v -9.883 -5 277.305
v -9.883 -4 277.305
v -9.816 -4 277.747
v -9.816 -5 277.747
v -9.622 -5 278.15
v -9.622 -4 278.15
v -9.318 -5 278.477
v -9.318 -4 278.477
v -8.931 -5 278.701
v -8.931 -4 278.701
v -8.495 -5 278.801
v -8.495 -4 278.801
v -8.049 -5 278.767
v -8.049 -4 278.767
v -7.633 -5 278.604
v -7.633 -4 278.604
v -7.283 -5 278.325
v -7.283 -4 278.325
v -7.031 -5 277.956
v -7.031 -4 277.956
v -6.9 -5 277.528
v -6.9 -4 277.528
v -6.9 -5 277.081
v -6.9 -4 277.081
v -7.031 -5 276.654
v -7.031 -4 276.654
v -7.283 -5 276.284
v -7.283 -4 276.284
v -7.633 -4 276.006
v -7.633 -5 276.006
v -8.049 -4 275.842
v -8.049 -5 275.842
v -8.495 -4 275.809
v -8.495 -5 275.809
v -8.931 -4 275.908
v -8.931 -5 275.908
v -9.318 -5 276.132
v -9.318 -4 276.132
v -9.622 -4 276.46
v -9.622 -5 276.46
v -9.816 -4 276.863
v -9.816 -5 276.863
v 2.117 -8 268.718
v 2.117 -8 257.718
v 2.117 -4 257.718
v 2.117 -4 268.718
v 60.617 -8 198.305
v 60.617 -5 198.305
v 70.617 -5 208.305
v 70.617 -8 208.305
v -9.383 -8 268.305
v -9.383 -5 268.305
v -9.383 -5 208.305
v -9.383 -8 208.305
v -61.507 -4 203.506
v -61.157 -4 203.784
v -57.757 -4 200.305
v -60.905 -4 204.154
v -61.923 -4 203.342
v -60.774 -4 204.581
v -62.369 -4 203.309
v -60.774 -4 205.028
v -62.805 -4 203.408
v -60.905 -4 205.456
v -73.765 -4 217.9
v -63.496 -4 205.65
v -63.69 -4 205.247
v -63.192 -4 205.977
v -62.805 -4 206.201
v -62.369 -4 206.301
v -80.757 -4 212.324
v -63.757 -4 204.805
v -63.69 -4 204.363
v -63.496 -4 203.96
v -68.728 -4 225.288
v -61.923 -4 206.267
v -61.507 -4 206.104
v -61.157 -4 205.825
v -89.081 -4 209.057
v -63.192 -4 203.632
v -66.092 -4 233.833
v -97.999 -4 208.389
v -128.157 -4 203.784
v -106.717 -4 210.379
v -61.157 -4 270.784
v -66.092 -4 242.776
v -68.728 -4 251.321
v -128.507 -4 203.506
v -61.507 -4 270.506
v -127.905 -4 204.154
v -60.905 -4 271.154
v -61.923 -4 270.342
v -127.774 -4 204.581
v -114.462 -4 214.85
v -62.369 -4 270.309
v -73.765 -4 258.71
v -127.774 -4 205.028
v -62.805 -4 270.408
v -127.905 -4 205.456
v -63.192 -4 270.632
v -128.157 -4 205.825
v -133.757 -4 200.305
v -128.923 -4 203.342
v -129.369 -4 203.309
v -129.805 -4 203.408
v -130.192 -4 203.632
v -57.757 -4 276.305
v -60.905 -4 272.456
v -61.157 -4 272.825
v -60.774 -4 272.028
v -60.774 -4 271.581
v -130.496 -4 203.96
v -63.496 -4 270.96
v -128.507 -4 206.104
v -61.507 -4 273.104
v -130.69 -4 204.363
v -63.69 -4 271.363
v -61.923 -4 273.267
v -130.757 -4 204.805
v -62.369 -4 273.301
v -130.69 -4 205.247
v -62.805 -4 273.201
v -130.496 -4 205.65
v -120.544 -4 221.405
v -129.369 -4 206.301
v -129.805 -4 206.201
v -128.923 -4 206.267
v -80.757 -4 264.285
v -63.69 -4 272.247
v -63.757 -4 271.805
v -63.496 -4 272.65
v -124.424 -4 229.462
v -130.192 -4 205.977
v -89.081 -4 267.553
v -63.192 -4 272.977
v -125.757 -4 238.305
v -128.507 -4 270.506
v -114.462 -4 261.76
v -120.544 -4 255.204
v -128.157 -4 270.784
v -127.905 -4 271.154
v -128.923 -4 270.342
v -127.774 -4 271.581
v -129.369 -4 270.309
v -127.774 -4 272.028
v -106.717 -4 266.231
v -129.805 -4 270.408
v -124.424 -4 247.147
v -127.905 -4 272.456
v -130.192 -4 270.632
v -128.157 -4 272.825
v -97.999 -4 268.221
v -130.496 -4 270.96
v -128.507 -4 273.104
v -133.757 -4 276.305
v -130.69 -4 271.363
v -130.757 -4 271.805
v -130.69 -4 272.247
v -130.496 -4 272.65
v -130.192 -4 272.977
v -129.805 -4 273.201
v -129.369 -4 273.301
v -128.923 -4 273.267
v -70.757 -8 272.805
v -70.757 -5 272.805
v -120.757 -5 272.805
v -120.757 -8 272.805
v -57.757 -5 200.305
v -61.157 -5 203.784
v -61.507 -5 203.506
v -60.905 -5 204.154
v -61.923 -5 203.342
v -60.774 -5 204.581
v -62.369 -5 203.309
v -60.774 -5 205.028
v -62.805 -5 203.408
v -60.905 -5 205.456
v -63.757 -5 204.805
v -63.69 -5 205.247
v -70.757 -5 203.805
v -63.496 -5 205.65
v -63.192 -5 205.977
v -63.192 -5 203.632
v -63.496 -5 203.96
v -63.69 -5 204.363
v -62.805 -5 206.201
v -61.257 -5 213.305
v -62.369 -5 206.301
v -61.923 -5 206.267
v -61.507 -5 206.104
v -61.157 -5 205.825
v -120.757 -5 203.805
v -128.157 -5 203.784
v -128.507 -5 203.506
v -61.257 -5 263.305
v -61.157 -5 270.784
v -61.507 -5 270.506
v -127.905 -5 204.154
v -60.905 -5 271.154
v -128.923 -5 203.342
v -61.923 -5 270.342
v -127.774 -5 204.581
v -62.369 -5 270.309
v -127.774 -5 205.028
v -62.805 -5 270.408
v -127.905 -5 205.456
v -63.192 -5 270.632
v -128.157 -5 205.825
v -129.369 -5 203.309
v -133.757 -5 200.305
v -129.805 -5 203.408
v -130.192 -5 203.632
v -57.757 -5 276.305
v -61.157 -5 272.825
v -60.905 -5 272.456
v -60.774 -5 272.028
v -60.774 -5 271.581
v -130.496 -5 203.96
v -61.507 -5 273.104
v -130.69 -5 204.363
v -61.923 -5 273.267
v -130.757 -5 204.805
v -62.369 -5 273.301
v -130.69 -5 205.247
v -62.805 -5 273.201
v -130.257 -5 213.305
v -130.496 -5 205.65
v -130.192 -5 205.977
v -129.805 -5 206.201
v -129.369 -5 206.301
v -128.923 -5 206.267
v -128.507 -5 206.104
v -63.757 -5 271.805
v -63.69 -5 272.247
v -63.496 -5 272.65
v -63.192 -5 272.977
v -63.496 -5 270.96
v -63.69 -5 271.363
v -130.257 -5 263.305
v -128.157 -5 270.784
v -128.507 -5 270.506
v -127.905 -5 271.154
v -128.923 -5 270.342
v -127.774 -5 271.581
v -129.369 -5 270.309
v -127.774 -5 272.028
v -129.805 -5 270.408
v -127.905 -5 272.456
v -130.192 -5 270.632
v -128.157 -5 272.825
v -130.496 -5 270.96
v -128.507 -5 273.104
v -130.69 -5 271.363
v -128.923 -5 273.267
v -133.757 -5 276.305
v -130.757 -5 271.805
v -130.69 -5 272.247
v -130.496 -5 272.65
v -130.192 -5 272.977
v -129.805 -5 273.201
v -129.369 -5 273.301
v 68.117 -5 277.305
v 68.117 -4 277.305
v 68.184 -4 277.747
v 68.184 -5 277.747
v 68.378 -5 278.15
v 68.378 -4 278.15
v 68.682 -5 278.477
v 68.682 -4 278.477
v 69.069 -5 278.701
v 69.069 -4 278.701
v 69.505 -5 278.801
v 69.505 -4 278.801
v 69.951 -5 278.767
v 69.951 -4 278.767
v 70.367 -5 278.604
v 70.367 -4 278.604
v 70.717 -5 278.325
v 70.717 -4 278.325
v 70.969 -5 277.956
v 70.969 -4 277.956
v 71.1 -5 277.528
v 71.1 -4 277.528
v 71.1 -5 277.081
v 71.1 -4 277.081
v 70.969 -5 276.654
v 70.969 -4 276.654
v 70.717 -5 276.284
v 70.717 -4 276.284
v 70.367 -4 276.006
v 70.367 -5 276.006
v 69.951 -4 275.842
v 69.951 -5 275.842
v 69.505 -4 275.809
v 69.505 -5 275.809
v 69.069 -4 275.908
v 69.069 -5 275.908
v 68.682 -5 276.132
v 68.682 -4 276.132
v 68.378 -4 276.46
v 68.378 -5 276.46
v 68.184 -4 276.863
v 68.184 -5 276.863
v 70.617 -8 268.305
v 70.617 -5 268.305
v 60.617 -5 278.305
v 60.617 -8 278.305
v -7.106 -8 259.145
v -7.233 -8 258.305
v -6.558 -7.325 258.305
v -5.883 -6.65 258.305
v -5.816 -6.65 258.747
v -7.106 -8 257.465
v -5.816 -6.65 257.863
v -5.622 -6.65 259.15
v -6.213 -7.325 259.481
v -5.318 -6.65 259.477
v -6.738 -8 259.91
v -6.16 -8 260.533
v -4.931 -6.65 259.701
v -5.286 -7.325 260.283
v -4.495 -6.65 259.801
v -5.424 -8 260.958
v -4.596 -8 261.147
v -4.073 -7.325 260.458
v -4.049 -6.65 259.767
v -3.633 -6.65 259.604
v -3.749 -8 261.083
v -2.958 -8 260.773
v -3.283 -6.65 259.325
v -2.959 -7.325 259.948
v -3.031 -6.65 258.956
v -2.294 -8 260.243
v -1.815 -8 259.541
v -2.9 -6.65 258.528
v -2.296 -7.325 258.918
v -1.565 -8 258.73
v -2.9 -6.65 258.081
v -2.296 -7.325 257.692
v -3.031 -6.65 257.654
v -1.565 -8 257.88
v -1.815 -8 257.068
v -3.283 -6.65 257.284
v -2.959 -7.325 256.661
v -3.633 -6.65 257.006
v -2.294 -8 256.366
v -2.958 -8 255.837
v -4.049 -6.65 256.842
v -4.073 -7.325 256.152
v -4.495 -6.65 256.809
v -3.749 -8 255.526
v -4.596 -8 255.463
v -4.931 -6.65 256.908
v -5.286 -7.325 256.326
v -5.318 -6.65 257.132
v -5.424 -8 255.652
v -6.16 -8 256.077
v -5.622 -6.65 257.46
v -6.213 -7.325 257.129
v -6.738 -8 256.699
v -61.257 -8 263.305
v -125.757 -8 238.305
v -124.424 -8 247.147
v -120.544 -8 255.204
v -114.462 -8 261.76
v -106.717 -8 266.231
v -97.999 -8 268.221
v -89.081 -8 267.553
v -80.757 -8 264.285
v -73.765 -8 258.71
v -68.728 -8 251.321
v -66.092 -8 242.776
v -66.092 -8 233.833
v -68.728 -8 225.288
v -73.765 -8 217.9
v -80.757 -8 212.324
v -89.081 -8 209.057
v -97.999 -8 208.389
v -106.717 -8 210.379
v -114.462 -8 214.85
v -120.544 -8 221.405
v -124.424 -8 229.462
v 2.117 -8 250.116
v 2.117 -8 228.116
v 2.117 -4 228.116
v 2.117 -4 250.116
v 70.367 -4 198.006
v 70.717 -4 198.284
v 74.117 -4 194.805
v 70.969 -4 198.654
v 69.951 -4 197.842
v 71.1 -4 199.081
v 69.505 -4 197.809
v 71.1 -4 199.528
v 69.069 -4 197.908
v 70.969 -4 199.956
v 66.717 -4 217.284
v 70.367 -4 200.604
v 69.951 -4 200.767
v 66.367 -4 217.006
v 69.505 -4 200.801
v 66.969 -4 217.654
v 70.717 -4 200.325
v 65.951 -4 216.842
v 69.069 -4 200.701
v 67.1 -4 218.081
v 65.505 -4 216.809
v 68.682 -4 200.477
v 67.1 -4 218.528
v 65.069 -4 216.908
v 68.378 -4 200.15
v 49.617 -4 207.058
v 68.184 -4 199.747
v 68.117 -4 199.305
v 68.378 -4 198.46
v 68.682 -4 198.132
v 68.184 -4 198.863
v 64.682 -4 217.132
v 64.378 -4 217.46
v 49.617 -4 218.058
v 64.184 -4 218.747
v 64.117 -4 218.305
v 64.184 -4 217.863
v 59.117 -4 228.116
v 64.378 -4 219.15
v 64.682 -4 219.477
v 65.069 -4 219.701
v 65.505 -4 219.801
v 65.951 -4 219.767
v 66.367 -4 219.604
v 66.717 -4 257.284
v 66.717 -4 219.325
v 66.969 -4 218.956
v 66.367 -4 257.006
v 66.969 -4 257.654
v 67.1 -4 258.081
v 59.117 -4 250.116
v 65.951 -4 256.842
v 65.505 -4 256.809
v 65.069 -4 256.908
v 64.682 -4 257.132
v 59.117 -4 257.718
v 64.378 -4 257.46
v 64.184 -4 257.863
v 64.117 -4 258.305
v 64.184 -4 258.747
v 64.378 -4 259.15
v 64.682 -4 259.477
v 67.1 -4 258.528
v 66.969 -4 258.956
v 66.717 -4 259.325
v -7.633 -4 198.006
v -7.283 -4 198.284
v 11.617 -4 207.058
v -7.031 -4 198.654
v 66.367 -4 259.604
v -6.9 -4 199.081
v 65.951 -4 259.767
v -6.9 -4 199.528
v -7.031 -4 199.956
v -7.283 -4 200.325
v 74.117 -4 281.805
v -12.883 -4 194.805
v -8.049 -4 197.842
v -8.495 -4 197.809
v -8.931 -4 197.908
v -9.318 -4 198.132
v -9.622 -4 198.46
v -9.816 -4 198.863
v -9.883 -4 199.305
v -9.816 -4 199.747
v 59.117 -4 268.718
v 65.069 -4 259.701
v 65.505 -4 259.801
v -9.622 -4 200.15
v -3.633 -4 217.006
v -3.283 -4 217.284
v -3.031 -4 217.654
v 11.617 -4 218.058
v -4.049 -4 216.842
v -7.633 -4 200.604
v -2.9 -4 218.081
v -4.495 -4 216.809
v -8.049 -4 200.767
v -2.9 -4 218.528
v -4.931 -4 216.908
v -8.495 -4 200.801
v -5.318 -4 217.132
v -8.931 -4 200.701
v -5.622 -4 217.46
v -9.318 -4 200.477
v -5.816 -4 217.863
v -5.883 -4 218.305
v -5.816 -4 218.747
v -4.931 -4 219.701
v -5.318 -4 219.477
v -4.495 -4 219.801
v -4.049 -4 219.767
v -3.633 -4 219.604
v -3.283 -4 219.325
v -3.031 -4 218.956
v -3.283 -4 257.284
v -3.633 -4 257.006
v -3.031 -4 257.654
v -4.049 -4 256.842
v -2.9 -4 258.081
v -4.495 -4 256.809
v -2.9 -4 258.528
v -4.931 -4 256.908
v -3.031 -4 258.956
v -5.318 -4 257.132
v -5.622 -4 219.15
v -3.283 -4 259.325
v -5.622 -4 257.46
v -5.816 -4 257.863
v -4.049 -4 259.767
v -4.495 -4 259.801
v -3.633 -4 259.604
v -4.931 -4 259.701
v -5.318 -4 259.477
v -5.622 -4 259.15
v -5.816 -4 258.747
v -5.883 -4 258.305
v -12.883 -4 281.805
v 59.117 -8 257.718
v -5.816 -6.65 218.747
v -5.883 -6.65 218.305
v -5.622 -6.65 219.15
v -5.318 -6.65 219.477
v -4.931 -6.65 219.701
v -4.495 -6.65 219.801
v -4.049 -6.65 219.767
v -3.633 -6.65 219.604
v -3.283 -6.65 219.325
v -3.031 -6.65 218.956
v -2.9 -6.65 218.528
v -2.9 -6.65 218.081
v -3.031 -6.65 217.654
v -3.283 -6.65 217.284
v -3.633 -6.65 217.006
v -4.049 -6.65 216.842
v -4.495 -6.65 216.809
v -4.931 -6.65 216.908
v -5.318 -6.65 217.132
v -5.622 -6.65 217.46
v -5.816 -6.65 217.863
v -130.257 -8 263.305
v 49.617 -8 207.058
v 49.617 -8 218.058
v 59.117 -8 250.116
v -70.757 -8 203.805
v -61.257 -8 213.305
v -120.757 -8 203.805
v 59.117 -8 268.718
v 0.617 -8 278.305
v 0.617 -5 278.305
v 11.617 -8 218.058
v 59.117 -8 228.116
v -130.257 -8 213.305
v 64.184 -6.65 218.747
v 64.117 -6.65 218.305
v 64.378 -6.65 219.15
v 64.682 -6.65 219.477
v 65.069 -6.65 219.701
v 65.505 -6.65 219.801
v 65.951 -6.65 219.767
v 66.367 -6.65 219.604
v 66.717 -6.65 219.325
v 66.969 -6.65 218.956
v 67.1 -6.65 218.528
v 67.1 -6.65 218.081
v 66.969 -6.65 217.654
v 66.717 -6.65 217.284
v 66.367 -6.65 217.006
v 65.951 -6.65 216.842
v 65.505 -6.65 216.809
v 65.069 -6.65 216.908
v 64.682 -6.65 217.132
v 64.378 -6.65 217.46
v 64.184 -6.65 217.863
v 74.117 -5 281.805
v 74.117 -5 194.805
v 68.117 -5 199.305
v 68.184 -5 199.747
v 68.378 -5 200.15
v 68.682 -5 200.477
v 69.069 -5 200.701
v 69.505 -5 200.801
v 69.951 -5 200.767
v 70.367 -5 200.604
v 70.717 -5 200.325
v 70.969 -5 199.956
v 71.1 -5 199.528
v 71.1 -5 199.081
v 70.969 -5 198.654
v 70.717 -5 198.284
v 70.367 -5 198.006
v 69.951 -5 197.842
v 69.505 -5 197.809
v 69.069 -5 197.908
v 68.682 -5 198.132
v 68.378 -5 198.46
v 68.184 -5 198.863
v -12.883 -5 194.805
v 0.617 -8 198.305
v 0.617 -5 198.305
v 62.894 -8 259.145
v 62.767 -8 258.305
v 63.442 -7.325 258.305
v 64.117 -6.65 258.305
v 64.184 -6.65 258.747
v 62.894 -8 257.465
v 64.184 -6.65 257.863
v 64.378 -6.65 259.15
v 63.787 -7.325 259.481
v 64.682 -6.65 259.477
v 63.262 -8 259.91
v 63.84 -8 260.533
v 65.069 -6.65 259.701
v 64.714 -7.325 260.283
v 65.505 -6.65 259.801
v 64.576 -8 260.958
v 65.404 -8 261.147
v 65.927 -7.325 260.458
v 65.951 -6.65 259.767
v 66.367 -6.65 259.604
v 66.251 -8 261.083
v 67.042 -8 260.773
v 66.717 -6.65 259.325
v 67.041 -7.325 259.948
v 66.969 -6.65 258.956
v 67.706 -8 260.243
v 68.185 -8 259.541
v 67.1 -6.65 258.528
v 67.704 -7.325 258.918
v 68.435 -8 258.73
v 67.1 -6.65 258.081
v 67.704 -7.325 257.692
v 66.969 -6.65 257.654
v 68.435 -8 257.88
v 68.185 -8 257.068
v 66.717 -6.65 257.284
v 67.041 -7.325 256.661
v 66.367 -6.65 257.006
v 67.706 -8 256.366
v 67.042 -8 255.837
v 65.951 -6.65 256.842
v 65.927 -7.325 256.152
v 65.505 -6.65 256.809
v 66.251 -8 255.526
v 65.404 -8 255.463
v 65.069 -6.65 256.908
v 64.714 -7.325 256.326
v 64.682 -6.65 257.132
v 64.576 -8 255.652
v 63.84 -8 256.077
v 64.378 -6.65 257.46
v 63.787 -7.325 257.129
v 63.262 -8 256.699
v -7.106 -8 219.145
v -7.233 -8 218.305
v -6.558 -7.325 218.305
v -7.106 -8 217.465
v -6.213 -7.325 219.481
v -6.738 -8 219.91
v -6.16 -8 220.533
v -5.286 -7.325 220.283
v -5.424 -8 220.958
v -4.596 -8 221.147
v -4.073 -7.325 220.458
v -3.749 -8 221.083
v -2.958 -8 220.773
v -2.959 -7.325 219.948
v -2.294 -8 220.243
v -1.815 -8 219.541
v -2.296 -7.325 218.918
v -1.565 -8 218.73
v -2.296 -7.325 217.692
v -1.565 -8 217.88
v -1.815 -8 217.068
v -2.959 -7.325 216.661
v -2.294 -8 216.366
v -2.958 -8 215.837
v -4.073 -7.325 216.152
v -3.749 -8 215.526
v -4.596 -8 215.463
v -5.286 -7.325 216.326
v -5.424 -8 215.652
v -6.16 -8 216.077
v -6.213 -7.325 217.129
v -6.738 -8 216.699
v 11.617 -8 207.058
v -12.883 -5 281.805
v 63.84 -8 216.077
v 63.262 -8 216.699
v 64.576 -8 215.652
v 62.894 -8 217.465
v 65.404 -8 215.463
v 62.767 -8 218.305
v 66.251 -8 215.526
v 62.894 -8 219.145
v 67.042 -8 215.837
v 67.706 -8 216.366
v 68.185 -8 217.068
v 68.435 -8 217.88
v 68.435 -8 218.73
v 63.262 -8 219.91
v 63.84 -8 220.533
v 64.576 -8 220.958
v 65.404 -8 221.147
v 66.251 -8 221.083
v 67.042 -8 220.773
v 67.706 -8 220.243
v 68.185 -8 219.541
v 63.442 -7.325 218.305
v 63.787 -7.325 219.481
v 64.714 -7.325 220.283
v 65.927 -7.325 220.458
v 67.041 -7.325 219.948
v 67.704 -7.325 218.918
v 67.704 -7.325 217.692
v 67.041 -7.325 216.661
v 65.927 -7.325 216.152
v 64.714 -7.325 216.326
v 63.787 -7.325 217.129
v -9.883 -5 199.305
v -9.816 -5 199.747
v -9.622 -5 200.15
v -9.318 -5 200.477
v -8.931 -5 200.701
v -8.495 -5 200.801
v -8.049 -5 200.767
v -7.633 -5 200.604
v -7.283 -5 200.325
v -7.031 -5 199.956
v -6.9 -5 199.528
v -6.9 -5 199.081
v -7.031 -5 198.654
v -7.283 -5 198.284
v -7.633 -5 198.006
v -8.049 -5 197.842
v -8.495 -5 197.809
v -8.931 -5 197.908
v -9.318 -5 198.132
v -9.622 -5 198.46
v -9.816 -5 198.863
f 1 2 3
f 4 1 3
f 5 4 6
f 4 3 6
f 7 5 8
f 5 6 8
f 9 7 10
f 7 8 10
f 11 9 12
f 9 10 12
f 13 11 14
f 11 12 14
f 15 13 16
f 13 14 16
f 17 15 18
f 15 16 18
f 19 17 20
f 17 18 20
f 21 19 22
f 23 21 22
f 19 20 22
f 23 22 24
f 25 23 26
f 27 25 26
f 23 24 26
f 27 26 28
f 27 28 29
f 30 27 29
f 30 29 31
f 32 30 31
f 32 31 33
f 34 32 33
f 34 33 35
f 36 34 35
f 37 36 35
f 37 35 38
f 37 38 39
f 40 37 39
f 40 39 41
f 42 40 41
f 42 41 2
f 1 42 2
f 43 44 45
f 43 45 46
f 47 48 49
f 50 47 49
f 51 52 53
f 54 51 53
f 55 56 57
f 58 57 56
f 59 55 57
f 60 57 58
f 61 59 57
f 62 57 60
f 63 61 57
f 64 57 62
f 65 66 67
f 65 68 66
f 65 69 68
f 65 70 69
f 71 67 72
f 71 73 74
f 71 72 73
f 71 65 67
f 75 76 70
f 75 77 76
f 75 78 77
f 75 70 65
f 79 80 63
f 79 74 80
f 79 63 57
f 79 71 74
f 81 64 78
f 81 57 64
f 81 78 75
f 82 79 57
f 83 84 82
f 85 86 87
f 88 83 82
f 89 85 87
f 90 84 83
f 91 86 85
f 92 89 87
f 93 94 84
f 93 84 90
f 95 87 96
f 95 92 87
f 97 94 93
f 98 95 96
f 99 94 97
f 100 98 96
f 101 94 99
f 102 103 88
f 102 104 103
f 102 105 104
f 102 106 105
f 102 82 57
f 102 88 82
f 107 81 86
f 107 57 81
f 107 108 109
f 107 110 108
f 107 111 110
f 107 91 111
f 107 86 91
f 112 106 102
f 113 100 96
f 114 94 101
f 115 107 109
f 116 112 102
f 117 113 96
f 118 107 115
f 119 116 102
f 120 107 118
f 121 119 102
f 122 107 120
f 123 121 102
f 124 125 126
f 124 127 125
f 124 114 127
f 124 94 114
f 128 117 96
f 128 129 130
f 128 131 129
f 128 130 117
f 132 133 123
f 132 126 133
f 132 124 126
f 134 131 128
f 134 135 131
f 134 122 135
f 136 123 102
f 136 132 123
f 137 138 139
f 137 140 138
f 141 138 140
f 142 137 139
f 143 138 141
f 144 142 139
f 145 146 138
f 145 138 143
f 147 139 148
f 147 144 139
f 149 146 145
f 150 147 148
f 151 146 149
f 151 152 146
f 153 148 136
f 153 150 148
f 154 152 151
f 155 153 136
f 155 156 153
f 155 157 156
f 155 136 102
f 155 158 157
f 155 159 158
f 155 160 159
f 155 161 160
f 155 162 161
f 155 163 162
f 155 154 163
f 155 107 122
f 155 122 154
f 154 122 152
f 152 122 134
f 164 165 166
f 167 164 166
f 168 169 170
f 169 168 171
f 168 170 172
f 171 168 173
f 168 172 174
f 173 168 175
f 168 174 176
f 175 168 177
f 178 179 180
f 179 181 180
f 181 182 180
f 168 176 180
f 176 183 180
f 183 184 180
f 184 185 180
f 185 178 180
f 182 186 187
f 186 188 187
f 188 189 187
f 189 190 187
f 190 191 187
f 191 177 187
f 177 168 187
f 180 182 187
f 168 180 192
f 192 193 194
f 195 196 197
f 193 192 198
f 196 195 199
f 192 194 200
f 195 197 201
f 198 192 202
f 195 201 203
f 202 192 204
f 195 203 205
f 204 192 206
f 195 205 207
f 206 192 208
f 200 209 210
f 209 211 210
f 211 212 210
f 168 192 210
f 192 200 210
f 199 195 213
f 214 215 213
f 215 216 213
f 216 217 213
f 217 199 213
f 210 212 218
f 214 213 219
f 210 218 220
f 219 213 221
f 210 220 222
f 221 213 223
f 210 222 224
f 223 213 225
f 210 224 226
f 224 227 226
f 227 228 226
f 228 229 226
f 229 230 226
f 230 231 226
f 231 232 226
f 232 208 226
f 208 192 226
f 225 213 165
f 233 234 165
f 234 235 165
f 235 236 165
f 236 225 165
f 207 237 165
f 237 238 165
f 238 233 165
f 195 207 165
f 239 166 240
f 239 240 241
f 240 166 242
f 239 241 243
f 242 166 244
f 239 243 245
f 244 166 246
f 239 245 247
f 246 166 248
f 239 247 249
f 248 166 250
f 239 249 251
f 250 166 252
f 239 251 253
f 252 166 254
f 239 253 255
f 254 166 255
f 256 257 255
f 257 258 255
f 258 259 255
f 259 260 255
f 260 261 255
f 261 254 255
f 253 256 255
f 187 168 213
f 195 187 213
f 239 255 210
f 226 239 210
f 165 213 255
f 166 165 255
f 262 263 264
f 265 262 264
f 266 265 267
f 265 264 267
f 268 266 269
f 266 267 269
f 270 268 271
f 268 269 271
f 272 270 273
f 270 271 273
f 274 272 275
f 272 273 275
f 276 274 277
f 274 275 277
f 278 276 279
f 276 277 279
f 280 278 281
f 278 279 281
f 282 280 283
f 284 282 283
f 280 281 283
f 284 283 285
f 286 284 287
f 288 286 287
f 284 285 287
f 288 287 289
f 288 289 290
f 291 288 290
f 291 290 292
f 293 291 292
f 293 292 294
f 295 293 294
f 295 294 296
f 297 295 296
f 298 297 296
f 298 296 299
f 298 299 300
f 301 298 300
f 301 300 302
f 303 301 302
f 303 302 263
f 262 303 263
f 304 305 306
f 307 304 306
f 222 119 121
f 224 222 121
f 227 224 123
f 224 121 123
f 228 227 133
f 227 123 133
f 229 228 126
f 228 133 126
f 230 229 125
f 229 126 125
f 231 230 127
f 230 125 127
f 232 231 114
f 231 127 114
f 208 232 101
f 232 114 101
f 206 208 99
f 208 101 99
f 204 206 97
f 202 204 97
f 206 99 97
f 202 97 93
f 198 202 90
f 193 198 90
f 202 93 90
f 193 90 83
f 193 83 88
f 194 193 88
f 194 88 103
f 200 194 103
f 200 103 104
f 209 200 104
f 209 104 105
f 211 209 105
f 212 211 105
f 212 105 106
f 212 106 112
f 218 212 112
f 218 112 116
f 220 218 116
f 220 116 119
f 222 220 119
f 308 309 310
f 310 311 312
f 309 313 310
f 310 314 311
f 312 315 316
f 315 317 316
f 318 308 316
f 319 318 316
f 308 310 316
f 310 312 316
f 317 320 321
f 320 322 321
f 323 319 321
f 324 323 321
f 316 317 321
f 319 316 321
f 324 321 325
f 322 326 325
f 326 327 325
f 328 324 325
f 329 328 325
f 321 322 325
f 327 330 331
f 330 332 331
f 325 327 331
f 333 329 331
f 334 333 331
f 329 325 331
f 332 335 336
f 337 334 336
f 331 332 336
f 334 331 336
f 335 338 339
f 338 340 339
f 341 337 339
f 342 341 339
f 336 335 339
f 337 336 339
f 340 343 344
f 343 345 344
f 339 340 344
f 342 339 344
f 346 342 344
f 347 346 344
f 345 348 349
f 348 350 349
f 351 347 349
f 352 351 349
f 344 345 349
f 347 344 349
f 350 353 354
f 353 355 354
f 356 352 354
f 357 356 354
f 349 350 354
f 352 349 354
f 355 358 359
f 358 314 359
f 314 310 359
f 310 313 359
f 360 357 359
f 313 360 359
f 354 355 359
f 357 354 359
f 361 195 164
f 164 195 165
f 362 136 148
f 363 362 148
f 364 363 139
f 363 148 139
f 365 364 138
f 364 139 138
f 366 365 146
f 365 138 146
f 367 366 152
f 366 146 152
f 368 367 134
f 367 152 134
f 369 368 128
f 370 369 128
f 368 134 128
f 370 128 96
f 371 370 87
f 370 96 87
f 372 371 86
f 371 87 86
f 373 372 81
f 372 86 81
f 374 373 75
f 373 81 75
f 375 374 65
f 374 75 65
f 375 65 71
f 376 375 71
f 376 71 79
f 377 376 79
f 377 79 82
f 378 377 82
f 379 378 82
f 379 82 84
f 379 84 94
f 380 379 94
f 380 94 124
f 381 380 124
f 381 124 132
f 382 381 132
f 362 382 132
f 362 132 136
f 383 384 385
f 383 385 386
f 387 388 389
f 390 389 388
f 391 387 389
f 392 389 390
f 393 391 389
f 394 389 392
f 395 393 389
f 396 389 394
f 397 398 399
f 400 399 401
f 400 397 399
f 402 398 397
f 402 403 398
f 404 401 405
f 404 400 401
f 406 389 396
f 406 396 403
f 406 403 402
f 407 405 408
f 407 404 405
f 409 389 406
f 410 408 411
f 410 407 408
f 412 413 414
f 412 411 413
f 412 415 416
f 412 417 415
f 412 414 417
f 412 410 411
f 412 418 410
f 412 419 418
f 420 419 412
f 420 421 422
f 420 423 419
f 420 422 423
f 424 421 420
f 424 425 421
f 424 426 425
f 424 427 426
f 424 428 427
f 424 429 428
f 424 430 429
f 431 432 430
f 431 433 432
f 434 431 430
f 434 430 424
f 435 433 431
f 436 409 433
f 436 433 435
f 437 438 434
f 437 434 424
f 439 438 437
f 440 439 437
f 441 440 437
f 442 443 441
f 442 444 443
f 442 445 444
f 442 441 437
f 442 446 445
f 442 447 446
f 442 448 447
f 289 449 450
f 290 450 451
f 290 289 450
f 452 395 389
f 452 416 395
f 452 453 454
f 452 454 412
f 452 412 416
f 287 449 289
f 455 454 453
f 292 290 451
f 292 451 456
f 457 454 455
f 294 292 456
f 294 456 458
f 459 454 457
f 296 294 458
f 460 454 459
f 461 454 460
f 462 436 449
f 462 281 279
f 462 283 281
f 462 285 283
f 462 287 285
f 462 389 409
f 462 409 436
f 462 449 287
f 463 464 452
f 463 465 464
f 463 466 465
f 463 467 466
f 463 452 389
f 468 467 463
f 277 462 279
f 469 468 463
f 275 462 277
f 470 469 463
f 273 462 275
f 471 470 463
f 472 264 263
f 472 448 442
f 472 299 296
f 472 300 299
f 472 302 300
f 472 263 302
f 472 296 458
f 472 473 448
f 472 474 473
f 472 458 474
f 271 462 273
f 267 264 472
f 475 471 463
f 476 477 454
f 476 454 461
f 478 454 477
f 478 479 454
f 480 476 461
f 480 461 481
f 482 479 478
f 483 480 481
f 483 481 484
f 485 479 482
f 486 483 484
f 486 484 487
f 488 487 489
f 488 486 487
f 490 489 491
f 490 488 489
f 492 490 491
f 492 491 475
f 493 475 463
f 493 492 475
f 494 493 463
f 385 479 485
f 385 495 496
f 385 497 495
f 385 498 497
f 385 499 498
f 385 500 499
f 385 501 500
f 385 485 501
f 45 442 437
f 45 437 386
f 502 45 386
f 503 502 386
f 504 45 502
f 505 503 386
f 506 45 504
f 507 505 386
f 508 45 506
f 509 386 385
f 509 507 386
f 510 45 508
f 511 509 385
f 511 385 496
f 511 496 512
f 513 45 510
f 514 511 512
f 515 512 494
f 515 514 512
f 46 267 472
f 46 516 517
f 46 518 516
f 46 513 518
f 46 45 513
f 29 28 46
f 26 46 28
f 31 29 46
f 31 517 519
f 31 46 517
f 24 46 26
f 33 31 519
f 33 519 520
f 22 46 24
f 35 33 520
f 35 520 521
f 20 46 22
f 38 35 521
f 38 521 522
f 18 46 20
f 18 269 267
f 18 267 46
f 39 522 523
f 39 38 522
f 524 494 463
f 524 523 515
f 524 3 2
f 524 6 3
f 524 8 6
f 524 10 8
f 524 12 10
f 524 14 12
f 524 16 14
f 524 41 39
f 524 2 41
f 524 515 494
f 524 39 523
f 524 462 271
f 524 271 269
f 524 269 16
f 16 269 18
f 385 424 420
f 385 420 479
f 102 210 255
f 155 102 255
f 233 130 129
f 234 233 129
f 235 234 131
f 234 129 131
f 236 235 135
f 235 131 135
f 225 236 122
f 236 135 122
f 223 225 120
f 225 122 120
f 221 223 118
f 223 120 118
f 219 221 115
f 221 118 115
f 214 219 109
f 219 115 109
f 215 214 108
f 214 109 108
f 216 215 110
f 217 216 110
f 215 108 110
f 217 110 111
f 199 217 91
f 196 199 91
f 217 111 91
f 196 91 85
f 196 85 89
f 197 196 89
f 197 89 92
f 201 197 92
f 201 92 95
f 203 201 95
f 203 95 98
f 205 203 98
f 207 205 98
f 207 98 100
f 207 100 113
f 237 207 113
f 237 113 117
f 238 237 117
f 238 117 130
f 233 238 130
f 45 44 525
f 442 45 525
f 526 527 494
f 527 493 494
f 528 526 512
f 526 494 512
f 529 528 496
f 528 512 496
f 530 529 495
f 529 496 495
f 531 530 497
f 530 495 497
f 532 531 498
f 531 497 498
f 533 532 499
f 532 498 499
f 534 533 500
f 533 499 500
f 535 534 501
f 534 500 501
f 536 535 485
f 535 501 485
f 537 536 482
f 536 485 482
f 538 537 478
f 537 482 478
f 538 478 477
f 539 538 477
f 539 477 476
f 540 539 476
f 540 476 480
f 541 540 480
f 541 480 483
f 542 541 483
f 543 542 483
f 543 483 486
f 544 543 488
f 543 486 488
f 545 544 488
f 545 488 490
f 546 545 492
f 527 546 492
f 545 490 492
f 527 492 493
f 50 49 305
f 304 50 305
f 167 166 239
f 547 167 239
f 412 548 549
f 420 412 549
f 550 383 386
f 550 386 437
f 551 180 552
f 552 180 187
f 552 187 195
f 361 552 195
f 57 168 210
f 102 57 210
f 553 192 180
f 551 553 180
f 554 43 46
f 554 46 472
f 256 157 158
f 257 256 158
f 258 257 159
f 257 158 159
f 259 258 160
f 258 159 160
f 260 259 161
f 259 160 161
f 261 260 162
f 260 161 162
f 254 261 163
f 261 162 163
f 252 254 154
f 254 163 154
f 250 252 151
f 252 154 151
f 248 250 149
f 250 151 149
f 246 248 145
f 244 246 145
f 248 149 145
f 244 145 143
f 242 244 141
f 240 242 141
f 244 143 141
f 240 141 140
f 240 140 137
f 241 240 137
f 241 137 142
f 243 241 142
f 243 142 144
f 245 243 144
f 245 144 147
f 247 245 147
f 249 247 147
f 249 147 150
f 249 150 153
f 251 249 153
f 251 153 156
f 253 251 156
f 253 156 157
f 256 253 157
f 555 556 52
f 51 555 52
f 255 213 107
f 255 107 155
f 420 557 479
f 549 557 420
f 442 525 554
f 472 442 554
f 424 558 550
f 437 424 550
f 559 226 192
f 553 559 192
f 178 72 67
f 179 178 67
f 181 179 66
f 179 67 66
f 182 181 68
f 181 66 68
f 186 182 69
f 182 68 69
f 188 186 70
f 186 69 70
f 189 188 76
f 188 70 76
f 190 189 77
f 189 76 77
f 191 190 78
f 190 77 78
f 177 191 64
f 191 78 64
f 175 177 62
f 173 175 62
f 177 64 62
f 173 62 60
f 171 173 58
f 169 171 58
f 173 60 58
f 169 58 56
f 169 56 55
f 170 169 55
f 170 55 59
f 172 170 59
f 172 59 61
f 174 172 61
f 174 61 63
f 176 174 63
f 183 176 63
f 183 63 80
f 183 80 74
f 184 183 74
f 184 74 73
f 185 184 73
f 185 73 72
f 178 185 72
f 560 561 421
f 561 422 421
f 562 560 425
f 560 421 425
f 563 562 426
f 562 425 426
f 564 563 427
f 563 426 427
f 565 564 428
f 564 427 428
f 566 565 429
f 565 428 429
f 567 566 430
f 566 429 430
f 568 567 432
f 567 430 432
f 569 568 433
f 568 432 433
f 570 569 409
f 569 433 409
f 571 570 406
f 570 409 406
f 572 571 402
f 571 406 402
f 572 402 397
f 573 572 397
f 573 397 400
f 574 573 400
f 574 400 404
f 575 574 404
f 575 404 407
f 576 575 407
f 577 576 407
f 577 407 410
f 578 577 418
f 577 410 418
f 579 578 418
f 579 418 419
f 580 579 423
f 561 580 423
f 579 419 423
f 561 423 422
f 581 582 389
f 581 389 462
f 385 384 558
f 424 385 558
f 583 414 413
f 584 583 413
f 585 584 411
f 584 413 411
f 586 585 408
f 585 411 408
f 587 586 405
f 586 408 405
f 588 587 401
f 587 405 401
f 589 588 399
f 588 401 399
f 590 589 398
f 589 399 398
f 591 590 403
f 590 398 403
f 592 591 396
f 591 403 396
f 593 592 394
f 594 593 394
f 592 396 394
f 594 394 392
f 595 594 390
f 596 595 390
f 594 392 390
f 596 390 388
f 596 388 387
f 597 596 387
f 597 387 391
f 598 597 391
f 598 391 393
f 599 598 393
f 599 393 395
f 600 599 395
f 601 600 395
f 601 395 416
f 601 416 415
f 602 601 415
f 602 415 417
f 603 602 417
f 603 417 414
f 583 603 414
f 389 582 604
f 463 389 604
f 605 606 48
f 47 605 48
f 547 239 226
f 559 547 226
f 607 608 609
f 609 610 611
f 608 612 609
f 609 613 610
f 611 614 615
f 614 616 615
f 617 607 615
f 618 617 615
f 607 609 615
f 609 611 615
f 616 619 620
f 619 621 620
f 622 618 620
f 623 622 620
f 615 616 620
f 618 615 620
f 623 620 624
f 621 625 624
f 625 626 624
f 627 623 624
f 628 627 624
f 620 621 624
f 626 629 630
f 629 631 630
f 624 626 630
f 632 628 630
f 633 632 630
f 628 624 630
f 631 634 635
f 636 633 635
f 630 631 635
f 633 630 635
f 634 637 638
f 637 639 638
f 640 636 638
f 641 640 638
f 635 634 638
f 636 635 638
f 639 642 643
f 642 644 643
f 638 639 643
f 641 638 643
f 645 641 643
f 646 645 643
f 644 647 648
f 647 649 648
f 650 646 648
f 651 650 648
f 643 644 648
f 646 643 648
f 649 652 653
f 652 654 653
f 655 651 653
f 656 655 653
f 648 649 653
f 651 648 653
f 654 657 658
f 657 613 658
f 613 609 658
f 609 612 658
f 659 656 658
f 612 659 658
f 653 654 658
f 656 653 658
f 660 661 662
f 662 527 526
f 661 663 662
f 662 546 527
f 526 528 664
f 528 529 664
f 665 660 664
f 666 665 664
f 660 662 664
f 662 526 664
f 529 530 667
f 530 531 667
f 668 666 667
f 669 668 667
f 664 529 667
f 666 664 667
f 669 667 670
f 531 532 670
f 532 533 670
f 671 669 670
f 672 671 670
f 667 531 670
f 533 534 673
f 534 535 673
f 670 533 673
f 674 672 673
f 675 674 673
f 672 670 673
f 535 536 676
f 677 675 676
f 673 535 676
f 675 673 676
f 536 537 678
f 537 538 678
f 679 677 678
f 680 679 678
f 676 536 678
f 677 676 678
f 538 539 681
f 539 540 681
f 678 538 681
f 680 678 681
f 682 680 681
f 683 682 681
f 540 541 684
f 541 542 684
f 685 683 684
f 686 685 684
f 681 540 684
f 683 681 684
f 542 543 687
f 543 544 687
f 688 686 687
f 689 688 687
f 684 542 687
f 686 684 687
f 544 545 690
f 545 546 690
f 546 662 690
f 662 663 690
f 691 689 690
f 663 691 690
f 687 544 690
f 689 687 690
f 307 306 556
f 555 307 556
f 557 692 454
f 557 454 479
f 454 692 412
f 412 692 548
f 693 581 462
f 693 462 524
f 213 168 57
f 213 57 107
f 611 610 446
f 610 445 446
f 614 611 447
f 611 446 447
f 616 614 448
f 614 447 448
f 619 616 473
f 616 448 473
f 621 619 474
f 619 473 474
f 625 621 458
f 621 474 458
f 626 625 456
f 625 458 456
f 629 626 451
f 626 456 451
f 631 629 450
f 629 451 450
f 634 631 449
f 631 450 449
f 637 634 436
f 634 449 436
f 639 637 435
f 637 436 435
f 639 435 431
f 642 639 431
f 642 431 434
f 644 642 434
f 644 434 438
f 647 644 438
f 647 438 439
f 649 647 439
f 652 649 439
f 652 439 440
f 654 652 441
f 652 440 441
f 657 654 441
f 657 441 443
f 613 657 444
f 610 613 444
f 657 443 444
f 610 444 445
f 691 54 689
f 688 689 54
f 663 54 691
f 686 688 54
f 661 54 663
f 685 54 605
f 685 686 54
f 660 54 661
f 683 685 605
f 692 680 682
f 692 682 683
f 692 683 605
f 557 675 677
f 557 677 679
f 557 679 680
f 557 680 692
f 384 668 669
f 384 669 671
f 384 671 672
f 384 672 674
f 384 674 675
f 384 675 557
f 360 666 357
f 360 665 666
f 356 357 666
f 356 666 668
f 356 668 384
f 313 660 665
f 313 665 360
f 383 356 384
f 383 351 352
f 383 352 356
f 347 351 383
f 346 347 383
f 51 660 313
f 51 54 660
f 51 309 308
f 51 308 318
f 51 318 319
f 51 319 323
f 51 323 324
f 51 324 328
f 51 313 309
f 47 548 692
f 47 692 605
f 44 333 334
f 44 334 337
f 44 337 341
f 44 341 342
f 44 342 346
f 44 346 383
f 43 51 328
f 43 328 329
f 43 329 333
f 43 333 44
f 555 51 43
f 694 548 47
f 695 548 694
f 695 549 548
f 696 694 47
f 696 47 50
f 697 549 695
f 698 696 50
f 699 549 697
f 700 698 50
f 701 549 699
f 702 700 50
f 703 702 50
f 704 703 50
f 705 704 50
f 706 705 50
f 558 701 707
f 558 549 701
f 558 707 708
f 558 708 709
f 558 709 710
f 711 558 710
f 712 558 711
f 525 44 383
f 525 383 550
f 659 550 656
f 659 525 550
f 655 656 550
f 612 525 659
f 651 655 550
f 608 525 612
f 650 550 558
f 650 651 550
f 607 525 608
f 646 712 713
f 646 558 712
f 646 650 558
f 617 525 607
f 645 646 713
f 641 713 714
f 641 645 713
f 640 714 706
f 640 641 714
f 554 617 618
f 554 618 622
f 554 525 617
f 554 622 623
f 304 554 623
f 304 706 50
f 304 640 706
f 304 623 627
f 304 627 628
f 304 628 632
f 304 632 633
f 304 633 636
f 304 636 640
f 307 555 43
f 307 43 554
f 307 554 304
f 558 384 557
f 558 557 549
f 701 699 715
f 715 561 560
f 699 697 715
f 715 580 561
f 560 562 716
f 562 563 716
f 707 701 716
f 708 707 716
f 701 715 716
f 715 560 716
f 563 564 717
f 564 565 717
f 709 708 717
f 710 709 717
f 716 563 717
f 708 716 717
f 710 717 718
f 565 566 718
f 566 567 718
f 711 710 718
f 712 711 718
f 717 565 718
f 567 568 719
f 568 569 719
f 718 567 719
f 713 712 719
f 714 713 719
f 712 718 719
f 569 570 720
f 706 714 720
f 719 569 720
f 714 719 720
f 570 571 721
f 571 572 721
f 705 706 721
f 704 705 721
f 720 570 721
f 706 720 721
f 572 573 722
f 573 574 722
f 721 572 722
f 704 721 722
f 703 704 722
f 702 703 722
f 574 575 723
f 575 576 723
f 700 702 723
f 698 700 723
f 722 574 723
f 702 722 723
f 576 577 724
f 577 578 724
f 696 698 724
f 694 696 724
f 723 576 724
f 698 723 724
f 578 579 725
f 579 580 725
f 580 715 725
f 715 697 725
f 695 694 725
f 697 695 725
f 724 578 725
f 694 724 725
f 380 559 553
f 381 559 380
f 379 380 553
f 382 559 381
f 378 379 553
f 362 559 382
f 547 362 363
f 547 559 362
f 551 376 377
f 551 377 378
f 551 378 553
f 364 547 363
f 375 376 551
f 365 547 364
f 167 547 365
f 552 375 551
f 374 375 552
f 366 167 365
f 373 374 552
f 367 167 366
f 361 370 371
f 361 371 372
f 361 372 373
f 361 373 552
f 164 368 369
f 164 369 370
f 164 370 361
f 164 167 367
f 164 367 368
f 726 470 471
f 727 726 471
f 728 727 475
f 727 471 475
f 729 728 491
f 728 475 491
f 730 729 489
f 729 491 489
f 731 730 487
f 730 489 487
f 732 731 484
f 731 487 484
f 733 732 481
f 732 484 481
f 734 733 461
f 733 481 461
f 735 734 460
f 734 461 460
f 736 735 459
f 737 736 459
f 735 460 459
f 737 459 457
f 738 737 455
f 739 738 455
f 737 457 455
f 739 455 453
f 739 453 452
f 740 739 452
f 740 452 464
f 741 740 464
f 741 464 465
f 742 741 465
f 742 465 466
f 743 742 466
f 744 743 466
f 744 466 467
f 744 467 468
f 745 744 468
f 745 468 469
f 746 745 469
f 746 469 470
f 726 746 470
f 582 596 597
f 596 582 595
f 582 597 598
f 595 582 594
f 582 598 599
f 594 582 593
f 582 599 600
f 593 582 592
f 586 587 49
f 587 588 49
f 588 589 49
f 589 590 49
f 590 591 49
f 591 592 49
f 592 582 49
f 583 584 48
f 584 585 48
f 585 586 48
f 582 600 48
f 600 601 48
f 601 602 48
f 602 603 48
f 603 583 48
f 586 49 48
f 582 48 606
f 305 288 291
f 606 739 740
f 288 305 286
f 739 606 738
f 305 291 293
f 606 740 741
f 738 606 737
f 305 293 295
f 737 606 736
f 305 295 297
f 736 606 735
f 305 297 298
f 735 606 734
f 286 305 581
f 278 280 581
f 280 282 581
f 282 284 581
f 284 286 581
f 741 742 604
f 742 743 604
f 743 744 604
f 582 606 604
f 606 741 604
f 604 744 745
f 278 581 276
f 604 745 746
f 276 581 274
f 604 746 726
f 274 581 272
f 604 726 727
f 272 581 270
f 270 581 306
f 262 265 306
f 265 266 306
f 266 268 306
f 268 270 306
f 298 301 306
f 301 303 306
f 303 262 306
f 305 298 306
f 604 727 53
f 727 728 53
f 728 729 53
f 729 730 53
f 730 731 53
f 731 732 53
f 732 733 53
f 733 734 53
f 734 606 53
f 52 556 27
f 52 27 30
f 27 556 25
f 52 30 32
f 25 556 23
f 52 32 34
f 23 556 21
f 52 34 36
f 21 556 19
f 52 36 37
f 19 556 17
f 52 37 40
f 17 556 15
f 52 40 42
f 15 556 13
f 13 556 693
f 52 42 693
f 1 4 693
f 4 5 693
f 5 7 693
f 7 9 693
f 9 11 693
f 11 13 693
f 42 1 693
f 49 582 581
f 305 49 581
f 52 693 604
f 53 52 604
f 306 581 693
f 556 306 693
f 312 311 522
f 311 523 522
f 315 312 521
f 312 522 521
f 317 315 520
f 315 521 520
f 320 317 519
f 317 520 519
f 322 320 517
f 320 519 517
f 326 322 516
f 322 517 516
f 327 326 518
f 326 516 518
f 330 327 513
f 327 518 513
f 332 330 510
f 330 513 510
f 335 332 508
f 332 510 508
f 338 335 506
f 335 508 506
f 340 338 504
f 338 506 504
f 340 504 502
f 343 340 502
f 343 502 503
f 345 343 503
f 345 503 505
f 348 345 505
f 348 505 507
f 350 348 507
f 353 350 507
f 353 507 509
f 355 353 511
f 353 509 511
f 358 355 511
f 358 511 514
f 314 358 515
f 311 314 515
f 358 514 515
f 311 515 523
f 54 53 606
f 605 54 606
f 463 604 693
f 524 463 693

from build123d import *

# Parameters (mm, degrees)
F2_DEPTH        = 3
F3_W            = 76
F3_H            = 76
F4_DEPTH        = 1
F6_D            = 3
F7_D            = 60
F9_DEPTH        = 3
F10_W           = 87
F10_H           = 87
F11_DEPTH       = 1
F13_D           = 3
F14_D           = 3
F14_CSINK_D     = 5.7
F14_CSINK_ANGLE = 90
F15_W           = 57
F15_H           = 11
F15_H_2         = 22
F15_W_2         = 38
F16_DEPTH       = 5


with BuildPart() as f2:
    # F1 (on offset) → F2 (new body)
    with BuildSketch(Plane.XZ.offset(5)):
        Polygon((-61.25688, 238.304736), (-61.25688, 263.304736), (-70.75688, 272.804736), (-95.75688, 272.804736), (-120.75688, 272.804736), (-130.25688, 263.304736), (-130.25688, 238.304736), (-130.25688, 213.304736), (-120.75688, 203.804736), (-95.75688, 203.804736), (-70.75688, 203.804736), (-61.25688, 213.304736), align=None)
    extrude(amount=F2_DEPTH)

    # F3 (on face) → F4 (join)
    with BuildSketch(Plane(origin=(0, -5, 0), x_dir=(-1, 0, 0), z_dir=(0, 1, 0))):
        with Locations((95.75688, 238.304736)):
            Rectangle(F3_W, F3_H)
    extrude(amount=F4_DEPTH)

    # F6 (through all)
    with Locations(Plane.XZ.offset(8)):
        with Locations((-129.25688, 271.804736), (-62.25688, 271.804736), (-62.25688, 204.804736), (-129.25688, 204.804736)):
            Hole(F6_D / 2)

    # F7 (through all)
    with Locations(Plane.XZ.offset(8)):
        with Locations((-95.75688, 238.304736)):
            Hole(F7_D / 2)


with BuildPart() as f9:
    # F8 (on offset) → F9 (new body)
    with BuildSketch(Plane.XZ.offset(5)):
        Polygon((70.617062, 238.304736), (70.617062, 268.304736), (60.617062, 278.304736), (30.617062, 278.304736), (0.617062, 278.304736), (-9.382938, 268.304736), (-9.382938, 238.304736), (-9.382938, 208.304736), (0.617062, 198.304736), (30.617062, 198.304736), (60.617062, 198.304736), (70.617062, 208.304736), align=None)
    extrude(amount=F9_DEPTH)

    # F10 (on face) → F11 (join)
    with BuildSketch(Plane(origin=(0, -5, 0), x_dir=(-1, 0, 0), z_dir=(0, 1, 0))):
        with Locations((-30.617062, 238.304736)):
            Rectangle(F10_W, F10_H)
    extrude(amount=F11_DEPTH)

    # F13 (through all)
    with Locations(Plane.XZ.offset(8)):
        with Locations((-8.382938, 277.304736), (-8.382938, 199.304736), (69.617062, 199.304736), (69.617062, 277.304736)):
            Hole(F13_D / 2)

    # F14 (through all)
    with Locations(Plane.XZ.offset(8)):
        with Locations((-4.382938, 258.304736), (-4.382938, 218.304736), (65.617062, 218.304736), (65.617062, 258.304736)):
            CounterSinkHole(F14_D / 2, F14_CSINK_D / 2, counter_sink_angle=F14_CSINK_ANGLE)

    # F15 (on face) → F16 (cut)
    with BuildSketch(Plane.XZ.offset(8)):
        with Locations((30.617062, 263.218444)):
            Rectangle(F15_W, F15_H)
        with Locations((30.617062, 239.115536)):
            Rectangle(F15_W, F15_H_2)
        with Locations((30.617062, 212.557742)):
            Rectangle(F15_W_2, F15_H)
    extrude(amount=-F16_DEPTH, mode=Mode.SUBTRACT)


solid = Compound([f2.part, f9.part])
